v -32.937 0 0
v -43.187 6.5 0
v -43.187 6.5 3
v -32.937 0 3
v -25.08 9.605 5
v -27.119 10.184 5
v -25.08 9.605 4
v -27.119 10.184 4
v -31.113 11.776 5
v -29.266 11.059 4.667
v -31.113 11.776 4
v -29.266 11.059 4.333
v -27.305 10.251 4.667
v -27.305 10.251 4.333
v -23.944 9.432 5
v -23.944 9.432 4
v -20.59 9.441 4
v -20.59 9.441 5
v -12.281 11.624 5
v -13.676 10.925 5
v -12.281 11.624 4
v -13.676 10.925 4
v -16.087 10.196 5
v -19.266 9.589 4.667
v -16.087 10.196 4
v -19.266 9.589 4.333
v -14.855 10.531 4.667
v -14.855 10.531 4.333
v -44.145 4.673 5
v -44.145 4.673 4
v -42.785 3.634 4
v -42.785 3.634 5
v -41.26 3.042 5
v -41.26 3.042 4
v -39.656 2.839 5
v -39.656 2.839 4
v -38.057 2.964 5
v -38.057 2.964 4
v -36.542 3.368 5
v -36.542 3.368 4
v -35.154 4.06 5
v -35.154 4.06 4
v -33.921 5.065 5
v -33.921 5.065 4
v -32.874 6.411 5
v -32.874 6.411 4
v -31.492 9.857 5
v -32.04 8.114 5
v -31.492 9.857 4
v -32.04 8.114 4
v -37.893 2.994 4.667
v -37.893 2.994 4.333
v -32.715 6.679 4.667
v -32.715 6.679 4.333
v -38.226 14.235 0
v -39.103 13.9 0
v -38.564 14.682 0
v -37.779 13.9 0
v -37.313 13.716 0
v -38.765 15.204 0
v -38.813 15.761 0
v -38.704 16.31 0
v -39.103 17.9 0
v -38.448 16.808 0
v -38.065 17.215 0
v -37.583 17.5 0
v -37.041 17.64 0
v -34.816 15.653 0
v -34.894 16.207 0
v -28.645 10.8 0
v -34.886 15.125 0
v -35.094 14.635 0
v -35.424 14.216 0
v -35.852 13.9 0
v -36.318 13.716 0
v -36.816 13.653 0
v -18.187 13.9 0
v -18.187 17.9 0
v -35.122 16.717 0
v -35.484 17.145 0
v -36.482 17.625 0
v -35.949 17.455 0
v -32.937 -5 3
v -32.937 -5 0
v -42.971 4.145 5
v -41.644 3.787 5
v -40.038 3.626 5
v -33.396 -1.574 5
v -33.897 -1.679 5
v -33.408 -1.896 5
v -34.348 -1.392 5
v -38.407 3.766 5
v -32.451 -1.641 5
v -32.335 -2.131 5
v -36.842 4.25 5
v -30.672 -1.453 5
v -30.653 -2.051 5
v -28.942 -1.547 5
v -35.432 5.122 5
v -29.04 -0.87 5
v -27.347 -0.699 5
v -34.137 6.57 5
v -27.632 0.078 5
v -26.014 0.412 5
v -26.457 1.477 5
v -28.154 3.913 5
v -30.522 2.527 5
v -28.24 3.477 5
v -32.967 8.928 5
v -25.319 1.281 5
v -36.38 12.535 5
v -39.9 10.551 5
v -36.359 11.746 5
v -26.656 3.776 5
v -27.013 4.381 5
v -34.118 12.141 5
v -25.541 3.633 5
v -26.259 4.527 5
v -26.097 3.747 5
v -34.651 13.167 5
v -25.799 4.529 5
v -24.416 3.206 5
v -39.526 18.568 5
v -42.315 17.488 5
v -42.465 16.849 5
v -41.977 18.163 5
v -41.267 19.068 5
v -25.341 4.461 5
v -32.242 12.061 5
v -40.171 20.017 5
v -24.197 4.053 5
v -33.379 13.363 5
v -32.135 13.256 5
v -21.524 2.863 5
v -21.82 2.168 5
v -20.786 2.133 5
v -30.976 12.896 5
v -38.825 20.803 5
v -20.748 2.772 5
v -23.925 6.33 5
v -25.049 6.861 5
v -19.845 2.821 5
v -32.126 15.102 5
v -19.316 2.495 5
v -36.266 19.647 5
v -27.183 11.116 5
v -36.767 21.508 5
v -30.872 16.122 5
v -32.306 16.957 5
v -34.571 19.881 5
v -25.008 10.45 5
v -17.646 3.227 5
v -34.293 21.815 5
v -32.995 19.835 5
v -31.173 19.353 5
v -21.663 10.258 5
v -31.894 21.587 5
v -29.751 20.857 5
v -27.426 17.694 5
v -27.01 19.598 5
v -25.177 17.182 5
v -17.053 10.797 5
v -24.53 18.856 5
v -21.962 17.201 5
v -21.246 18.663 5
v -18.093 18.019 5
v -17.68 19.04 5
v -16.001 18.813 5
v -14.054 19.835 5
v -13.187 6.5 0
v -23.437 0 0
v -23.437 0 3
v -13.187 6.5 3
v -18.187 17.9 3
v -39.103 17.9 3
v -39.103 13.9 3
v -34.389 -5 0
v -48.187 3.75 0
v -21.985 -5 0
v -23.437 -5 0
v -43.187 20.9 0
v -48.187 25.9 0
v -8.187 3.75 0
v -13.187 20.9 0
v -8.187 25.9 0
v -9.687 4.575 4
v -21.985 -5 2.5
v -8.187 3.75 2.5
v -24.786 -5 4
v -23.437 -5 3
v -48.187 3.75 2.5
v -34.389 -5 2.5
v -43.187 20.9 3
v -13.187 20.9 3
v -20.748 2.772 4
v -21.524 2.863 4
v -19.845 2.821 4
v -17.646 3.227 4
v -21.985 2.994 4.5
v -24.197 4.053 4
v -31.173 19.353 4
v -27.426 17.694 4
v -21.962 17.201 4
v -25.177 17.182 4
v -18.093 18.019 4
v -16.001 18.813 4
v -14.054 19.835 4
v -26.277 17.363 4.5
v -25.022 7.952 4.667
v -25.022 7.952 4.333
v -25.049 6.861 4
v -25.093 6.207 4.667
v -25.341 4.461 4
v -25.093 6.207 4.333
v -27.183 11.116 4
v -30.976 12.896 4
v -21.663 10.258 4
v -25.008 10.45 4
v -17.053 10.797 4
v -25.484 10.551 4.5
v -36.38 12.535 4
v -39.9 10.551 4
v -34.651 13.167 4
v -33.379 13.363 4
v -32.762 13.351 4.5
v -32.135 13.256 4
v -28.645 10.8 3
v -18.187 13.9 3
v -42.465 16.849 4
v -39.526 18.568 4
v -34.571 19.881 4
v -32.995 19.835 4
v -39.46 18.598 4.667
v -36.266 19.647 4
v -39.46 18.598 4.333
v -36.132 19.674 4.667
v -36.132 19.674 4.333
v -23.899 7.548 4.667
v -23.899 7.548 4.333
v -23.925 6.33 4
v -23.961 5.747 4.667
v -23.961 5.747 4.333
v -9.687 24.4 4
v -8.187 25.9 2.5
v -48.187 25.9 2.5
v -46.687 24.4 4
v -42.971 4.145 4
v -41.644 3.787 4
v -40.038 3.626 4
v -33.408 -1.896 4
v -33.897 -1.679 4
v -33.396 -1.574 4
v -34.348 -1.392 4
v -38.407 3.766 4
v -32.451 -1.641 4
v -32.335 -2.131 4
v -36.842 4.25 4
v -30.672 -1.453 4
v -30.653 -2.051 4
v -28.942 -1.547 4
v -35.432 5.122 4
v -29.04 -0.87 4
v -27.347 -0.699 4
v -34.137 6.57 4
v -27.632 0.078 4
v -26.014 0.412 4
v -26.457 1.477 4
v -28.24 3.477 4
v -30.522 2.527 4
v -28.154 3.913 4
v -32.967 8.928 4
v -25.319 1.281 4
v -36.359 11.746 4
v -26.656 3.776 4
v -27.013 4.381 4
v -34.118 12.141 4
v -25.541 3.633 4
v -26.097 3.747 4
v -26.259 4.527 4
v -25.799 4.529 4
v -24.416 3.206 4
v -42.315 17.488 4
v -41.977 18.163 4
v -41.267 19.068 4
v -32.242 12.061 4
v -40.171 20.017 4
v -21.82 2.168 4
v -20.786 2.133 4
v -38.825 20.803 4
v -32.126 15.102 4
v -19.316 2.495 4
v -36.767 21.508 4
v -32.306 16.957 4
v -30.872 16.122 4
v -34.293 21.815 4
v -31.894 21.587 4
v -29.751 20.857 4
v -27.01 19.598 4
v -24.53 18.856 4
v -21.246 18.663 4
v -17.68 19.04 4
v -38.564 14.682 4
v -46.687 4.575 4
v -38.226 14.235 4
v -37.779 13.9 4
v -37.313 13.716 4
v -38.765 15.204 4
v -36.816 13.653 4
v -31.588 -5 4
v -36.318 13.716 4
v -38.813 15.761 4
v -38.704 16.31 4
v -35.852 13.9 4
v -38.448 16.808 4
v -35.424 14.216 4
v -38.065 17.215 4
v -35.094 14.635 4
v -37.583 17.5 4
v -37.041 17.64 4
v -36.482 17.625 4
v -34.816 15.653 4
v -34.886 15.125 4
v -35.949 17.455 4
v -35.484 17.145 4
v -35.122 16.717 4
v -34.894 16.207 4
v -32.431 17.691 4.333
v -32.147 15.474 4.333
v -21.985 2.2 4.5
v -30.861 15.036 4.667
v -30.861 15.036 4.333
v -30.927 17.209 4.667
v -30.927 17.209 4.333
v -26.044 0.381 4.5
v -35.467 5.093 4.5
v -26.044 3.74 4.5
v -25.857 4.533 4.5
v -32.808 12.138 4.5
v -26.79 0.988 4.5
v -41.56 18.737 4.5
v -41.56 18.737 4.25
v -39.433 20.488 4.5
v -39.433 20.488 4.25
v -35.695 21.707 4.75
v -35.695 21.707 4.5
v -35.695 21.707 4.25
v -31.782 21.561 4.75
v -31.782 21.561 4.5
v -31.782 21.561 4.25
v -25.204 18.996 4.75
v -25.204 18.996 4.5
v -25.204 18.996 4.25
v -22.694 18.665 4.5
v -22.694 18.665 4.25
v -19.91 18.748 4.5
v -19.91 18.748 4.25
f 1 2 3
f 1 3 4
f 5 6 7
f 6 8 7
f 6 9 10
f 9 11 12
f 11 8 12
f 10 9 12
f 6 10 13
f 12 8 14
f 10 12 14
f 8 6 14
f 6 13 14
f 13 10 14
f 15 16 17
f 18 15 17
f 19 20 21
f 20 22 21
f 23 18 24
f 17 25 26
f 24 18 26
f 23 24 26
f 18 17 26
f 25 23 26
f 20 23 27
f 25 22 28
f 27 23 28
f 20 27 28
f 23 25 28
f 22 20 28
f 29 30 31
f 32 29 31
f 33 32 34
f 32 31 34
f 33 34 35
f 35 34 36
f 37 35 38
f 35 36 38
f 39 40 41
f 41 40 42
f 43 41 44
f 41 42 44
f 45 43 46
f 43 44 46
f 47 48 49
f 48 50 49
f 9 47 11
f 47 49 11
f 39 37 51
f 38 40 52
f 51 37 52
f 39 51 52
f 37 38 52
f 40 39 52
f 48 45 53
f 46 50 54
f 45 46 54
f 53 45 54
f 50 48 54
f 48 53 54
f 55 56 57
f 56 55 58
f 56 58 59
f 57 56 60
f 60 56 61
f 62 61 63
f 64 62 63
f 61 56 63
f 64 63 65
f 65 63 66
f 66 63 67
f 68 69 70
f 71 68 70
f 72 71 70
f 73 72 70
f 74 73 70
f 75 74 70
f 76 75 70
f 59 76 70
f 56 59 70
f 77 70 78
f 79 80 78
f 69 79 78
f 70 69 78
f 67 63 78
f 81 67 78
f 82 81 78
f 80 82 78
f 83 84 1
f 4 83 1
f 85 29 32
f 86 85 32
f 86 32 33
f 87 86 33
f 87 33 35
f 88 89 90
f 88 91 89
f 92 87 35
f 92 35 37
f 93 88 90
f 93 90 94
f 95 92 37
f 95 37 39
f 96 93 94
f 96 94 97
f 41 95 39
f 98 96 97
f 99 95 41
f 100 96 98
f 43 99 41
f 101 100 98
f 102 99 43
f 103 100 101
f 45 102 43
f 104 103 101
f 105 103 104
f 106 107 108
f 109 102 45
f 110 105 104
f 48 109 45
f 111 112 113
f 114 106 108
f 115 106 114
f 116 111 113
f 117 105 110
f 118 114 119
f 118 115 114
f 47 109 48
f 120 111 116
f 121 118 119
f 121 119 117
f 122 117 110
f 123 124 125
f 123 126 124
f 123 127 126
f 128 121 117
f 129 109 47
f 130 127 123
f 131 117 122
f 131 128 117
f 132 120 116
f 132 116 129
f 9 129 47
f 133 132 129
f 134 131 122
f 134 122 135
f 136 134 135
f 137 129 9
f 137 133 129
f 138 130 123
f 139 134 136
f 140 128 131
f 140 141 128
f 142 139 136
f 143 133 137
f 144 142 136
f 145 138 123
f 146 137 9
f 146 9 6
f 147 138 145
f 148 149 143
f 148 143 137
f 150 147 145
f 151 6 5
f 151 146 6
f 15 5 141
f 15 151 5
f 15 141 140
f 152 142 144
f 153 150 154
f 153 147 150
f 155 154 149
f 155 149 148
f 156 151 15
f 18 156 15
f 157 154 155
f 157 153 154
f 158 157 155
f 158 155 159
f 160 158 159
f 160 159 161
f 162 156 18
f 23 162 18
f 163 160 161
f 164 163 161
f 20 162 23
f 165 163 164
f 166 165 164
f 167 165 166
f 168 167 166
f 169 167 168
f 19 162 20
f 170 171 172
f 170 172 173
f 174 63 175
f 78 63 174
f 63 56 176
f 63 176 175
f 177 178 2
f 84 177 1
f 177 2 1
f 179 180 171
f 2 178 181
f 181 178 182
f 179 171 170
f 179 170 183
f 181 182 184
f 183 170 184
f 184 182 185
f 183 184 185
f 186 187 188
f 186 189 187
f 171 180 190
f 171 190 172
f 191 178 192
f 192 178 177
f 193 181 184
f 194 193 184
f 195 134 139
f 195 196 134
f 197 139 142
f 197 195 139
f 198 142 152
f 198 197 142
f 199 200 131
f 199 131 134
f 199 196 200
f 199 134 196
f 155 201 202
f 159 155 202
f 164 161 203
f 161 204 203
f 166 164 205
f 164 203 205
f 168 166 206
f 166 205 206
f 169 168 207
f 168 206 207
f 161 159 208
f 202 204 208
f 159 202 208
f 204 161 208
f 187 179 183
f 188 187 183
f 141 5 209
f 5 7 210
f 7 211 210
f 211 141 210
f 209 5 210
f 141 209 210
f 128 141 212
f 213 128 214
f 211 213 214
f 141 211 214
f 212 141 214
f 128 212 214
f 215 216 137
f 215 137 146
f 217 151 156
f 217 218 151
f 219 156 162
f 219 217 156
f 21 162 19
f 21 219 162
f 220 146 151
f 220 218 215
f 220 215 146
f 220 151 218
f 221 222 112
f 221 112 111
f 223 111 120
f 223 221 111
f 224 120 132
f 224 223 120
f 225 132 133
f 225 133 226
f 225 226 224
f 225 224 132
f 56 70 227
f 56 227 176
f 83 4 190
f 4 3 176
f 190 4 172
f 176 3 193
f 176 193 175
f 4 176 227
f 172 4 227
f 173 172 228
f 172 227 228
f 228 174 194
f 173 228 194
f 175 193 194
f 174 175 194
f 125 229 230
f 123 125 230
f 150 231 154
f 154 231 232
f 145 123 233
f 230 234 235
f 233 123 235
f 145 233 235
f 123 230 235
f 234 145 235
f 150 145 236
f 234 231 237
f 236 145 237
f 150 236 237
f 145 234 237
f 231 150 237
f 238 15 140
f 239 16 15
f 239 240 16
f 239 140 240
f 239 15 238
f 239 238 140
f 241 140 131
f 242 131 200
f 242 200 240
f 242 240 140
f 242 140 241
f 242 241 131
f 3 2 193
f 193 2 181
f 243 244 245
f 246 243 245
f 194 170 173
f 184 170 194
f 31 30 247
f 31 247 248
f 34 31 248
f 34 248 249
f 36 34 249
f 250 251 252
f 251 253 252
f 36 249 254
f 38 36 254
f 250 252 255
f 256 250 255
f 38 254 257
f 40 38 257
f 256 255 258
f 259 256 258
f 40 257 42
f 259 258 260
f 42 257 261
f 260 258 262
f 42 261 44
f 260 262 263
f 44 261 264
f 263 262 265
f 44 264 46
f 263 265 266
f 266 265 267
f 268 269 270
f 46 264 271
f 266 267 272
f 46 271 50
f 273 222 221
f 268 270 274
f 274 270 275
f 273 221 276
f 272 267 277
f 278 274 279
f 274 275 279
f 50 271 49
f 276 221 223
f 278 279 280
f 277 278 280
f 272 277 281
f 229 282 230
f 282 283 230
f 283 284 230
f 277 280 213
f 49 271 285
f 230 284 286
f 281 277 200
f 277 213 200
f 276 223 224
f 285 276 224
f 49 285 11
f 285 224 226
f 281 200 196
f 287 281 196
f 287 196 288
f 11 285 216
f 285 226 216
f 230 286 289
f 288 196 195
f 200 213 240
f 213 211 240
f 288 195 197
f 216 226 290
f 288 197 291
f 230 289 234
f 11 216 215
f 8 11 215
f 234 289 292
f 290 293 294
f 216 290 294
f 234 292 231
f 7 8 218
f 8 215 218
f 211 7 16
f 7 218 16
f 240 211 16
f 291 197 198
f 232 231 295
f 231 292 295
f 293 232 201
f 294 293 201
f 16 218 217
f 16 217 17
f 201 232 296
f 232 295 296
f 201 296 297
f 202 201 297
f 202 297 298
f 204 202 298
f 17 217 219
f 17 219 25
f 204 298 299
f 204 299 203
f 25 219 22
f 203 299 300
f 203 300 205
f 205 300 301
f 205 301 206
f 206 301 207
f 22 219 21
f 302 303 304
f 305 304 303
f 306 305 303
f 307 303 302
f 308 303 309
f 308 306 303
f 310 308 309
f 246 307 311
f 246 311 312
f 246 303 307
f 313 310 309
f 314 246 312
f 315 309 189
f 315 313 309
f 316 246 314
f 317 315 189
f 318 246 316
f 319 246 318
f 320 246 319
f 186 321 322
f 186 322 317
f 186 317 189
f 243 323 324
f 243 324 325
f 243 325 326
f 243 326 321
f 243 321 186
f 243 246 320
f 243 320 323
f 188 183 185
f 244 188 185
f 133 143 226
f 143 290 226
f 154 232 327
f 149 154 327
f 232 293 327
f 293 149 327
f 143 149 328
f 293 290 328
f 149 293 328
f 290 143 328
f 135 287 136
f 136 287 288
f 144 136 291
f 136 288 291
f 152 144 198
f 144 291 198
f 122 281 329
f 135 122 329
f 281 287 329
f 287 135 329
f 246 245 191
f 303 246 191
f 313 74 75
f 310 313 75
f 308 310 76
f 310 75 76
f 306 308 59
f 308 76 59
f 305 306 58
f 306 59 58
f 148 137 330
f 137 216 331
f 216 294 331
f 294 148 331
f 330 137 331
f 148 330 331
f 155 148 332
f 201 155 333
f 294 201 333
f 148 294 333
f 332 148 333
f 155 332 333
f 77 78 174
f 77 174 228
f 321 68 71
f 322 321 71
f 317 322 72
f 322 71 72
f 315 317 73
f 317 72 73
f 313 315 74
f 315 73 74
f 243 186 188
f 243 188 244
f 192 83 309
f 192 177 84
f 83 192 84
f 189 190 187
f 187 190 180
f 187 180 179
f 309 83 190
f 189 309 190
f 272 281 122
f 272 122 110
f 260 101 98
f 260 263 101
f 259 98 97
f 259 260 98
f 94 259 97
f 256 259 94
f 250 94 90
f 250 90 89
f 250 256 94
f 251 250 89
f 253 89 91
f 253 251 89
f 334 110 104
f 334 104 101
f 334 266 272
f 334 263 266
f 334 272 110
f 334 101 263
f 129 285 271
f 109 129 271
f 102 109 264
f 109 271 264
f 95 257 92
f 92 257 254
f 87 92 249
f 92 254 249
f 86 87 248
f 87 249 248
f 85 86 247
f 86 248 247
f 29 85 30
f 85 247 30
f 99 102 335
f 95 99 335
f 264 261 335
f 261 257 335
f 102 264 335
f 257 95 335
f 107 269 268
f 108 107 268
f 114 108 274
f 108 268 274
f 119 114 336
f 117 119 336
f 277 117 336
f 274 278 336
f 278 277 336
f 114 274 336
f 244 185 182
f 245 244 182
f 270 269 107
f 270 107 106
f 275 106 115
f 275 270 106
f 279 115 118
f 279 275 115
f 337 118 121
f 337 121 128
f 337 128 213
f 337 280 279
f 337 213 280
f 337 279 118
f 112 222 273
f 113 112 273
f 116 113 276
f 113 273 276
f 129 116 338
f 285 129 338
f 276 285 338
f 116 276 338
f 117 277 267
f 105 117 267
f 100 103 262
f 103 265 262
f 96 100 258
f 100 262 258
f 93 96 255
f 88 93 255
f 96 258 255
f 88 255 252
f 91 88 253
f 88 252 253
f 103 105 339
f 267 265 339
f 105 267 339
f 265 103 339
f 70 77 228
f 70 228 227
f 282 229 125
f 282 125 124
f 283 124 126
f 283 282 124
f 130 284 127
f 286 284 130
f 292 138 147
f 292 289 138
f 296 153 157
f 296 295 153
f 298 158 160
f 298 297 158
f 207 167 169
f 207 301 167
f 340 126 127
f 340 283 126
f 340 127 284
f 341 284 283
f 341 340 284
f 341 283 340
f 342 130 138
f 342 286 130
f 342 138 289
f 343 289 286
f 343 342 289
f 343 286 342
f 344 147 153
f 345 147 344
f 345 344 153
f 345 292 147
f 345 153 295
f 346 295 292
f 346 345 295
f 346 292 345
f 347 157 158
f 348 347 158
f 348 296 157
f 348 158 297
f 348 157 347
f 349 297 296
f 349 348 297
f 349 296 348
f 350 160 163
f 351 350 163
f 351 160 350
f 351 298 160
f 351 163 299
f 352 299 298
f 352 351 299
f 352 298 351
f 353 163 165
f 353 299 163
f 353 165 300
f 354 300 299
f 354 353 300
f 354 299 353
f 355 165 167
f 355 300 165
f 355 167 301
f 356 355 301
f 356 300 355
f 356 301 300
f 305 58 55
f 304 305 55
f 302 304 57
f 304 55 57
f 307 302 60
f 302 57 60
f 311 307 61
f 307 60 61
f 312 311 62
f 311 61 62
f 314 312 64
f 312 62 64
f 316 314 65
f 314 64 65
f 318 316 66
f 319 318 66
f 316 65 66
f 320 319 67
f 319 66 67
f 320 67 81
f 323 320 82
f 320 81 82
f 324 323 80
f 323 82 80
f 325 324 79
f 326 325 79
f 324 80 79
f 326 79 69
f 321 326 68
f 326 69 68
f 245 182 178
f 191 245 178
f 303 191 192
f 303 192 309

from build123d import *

# Parameters (mm, degrees)
F0_W     = 30
F0_H     = 14.4
F0_W_2   = 9.5
F0_H_2   = 5
F1_DEPTH = 4
F2_DEPTH = 3
F4_DEPTH = 1
F5_SIZE  = 1.5


with BuildPart() as f1:
    # F0 (on Top) → F1 (new body)
    with BuildSketch(Plane.XY):
        Polygon((-43.1869083047, 6.5), (-43.1869083047, 20.9), (-13.1869083047, 20.9), (-13.1869083047, 6.5), (-23.4369083047, 0), (-23.4369083047, -5), (-21.9851882324, -5), (-8.1869083047, 3.7501287347), (-8.1869083047, 25.9), (-48.1869083047, 25.9), (-48.1869083047, 3.7501287347), (-34.388628377, -5), (-32.9369083047, -5), (-32.9369083047, 0), align=None)
        with Locations((-28.1869083047, 13.7)):
            Rectangle(F0_W, F0_H)
        Polygon((-39.1032992899, 13.9), (-39.1032992899, 17.9), (-18.1869083047, 17.9), (-18.1869083047, 13.9), (-28.6451037973, 10.8), align=None, mode=Mode.SUBTRACT)
        Polygon((-13.1869083047, 6.5), (-43.1869083047, 6.5), (-32.9369083047, 0), (-23.4369083047, 0), align=None)
        with Locations((-28.1869083047, -2.5)):
            Rectangle(F0_W_2, F0_H_2)
        with BuildLine():
            Line((-18.1869083047, 17.9), (-39.1032992899, 17.9))
            Line((-39.1032992899, 17.9), (-39.1032992899, 13.9))
            Line((-39.1032992899, 13.9), (-37.7786630825, 13.9))
            ThreePointArc((-37.7786630825, 13.9), (-37.8338156014, 17.3741977051), (-34.8155427277, 15.6528260559))
            ThreePointArc((-34.8155427277, 15.6528260559), (-35.0941710785, 14.6345531822), (-35.8524223729, 13.9))
            Line((-35.8524223729, 13.9), (-18.1869083047, 13.9))
            Line((-18.1869083047, 13.9), (-18.1869083047, 17.9))
        make_face()
        with BuildLine():
            Line((-37.7786630825, 13.9), (-39.1032992899, 13.9))
            Line((-39.1032992899, 13.9), (-28.6451037973, 10.8))
            Line((-28.6451037973, 10.8), (-18.1869083047, 13.9))
            Line((-18.1869083047, 13.9), (-35.8524223729, 13.9))
            ThreePointArc((-35.8524223729, 13.9), (-36.8155427277, 13.6528260559), (-37.7786630825, 13.9))
        make_face()
    extrude(amount=F1_DEPTH)

    # F0 (on Top) → F2 (cut)
    with BuildSketch(Plane.XY):
        with Locations((-28.1869083047, 13.7)):
            Rectangle(F0_W, F0_H)
        Polygon((-39.1032992899, 13.9), (-39.1032992899, 17.9), (-18.1869083047, 17.9), (-18.1869083047, 13.9), (-28.6451037973, 10.8), align=None, mode=Mode.SUBTRACT)
        Polygon((-13.1869083047, 6.5), (-43.1869083047, 6.5), (-32.9369083047, 0), (-23.4369083047, 0), align=None)
        with Locations((-28.1869083047, -2.5)):
            Rectangle(F0_W_2, F0_H_2)
    extrude(amount=F2_DEPTH, mode=Mode.SUBTRACT)

    # F5
    f5_edges = [f1.edges().sort_by_distance(p)[0] for p in [
        (-41.287768, -0.624936, 4),
        (-48.186908, 14.825064, 4),
        (-28.186908, 25.9, 4),
        (-8.186908, 14.825064, 4),
        (-15.086048, -0.624936, 4),
    ]]
    chamfer(f5_edges, length=F5_SIZE)


with BuildPart() as f4:
    # F3 (on face) → F4 (new body)
    with BuildSketch(Plane.XY.offset(4)):
        with BuildLine():
            add(Edge.make_bspline(
                [(-42.4654167145, 16.8494712561), (-39.7938375841, 18.8531576552), (-35.864648273, 20.2127791296), (-32.9948905855, 19.8352541775)],
                knots=[0, 0, 0, 0, 0.3367336674, 0.3367336674, 0.3367336674, 0.3367336674], degree=3))
            add(Edge.make_bspline(
                [(-32.9948905855, 19.8352541775), (-32.3440314578, 19.7496317703), (-31.7476673073, 19.5746541344), (-31.1734072618, 19.3531280695)],
                knots=[0.3367336674, 0.3367336674, 0.3367336674, 0.3367336674, 0.4131046384, 0.4131046384, 0.4131046384, 0.4131046384], degree=3))
            add(Edge.make_bspline(
                [(-31.1734072618, 19.3531280695), (-29.5978329229, 18.7453358574), (-25.6508147134, 16.0615042571), (-17.7608904848, 17.5646834939), (-14.0538355336, 19.8352541775)],
                knots=[0.4131046384, 0.4131046384, 0.4131046384, 0.4131046384, 0.6226406196, 1, 1, 1, 1], degree=3))
            add(Edge.make_bspline(
                [(-42.4654167145, 16.8494712561), (-42.3726604929, 18.008949951), (-39.5993766245, 21.4286085388), (-31.3253802251, 22.5074804398), (-25.4250962682, 17.798905064), (-17.9107243535, 18.8059261112), (-14.0538355336, 19.8352541775)],
                knots=[0, 0, 0, 0, 0.1986315254, 0.4523082805, 0.6948192618, 1, 1, 1, 1], degree=3))
        make_face()
        with BuildLine():
            add(Edge.make_bspline(
                [(-32.9948905855, 19.8352541775), (-32.3440314578, 19.7496317703), (-31.7476673073, 19.5746541344), (-31.1734072618, 19.3531280695)],
                knots=[0.3367336674, 0.3367336674, 0.3367336674, 0.3367336674, 0.4131046384, 0.4131046384, 0.4131046384, 0.4131046384], degree=3))
            add(Edge.make_bspline(
                [(-32.9948905855, 19.8352541775), (-32.2896273329, 17.753049629), (-32.0126127544, 15.4491126865), (-32.1345889722, 13.255812889)],
                knots=[0, 0, 0, 0, 0.2225431575, 0.2225431575, 0.2225431575, 0.2225431575], degree=3))
            add(Edge.make_bspline(
                [(-32.134588974, 13.2558128888), (-31.7475533394, 13.1731038166), (-31.3627928139, 13.0483545557), (-30.9761098202, 12.8961333799)],
                knots=[0.3286914696, 0.3286914696, 0.3286914696, 0.3286914696, 0.3802894739, 0.3802894739, 0.3802894739, 0.3802894739], degree=3))
            add(Edge.make_bspline(
                [(-30.976109827, 12.8961333789), (-30.7712879528, 14.9993919589), (-30.8365034569, 17.2432759127), (-31.1734072618, 19.3531280695)],
                knots=[0.8062718014, 0.8062718014, 0.8062718014, 0.8062718014, 1, 1, 1, 1], degree=3))
        make_face()
        with BuildLine():
            add(Edge.make_bspline(
                [(-32.1345889722, 13.255812889), (-32.1569847951, 12.8531052564), (-32.1928313712, 12.4541274165), (-32.2419476004, 12.0609366653)],
                knots=[0.2225431575, 0.2225431575, 0.2225431575, 0.2225431575, 0.2634038863, 0.2634038863, 0.2634038863, 0.2634038863], degree=3))
            add(Edge.make_bspline(
                [(-39.8995094001, 10.551338084), (-37.4732565623, 12.0421009296), (-34.8160280141, 13.6831493791), (-32.3427257342, 13.3002914763), (-32.134588974, 13.2558128888)],
                knots=[0, 0, 0, 0, 0.3009435298, 0.3286914696, 0.3286914696, 0.3286914696, 0.3286914696], degree=3))
            add(Edge.make_bspline(
                [(-39.8995094001, 10.551338084), (-38.2007072715, 11.1867110314), (-35.0695646892, 12.456761007), (-32.4286591287, 12.094066028), (-32.2419476145, 12.0609366664)],
                knots=[0, 0, 0, 0, 0.2934865557, 0.3160525993, 0.3160525993, 0.3160525993, 0.3160525993], degree=3))
        make_face()
        with BuildLine():
            add(Edge.make_bspline(
                [(-30.9761098202, 12.8961333799), (-29.2963172809, 12.23486821), (-24.551812522, 8.9733096857), (-16.899658367, 10.8779082075), (-12.2810266912, 11.6243530065)],
                knots=[0.3802894739, 0.3802894739, 0.3802894739, 0.3802894739, 0.6044367579, 1, 1, 1, 1], degree=3))
            add(Edge.make_bspline(
                [(-31.112915177, 11.7758911415), (-31.0585745099, 12.1436838454), (-31.0129695193, 12.5176314999), (-30.976109827, 12.8961333789)],
                knots=[0.771408524, 0.771408524, 0.771408524, 0.771408524, 0.8062718014, 0.8062718014, 0.8062718014, 0.8062718014], degree=3))
            add(Edge.make_bspline(
                [(-31.1129151777, 11.7758911415), (-29.2735553981, 11.1875546271), (-27.486927637, 10.0877460543), (-25.0796457725, 9.6045233315)],
                knots=[0.362248868, 0.362248868, 0.362248868, 0.362248868, 0.590469567, 0.590469567, 0.590469567, 0.590469567], degree=3))
            add(Edge.make_bspline(
                [(-25.0796457725, 9.6045233315), (-24.7161044464, 9.5315483168), (-24.3384083341, 9.4726353068), (-23.9442382008, 9.4316694885)],
                knots=[0.590469567, 0.590469567, 0.590469567, 0.590469567, 0.624934852, 0.624934852, 0.624934852, 0.624934852], degree=3))
            add(Edge.make_bspline(
                [(-23.9442382008, 9.4316694885), (-19.6547196513, 8.985862913), (-13.4142369665, 10.665483242), (-12.2810266912, 11.6243530065)],
                knots=[0.624934852, 0.624934852, 0.624934852, 0.624934852, 1, 1, 1, 1], degree=3))
        make_face()
        with BuildLine():
            add(Edge.make_bspline(
                [(-32.134588974, 13.2558128888), (-31.7475533394, 13.1731038166), (-31.3627928139, 13.0483545557), (-30.9761098202, 12.8961333799)],
                knots=[0.3286914696, 0.3286914696, 0.3286914696, 0.3286914696, 0.3802894739, 0.3802894739, 0.3802894739, 0.3802894739], degree=3))
            add(Edge.make_bspline(
                [(-32.1345889722, 13.255812889), (-32.1569847951, 12.8531052564), (-32.1928313712, 12.4541274165), (-32.2419476004, 12.0609366653)],
                knots=[0.2225431575, 0.2225431575, 0.2225431575, 0.2225431575, 0.2634038863, 0.2634038863, 0.2634038863, 0.2634038863], degree=3))
            add(Edge.make_bspline(
                [(-32.2419476145, 12.0609366664), (-31.8597195461, 11.9931156113), (-31.4852370526, 11.8949817928), (-31.1129151777, 11.7758911415)],
                knots=[0.3160525993, 0.3160525993, 0.3160525993, 0.3160525993, 0.362248868, 0.362248868, 0.362248868, 0.362248868], degree=3))
            add(Edge.make_bspline(
                [(-31.112915177, 11.7758911415), (-31.0585745099, 12.1436838454), (-31.0129695193, 12.5176314999), (-30.976109827, 12.8961333789)],
                knots=[0.771408524, 0.771408524, 0.771408524, 0.771408524, 0.8062718014, 0.8062718014, 0.8062718014, 0.8062718014], degree=3))
        make_face()
        with BuildLine():
            add(Edge.make_bspline(
                [(-32.2419476145, 12.0609366664), (-31.8597195461, 11.9931156113), (-31.4852370526, 11.8949817928), (-31.1129151777, 11.7758911415)],
                knots=[0.3160525993, 0.3160525993, 0.3160525993, 0.3160525993, 0.362248868, 0.362248868, 0.362248868, 0.362248868], degree=3))
            add(Edge.make_bspline(
                [(-32.2419476004, 12.0609366653), (-32.6073918669, 9.1354412048), (-35.2726418826, 2.8236045142), (-41.8122783303, 3.3667995594), (-44.1449210048, 4.6730795875)],
                knots=[0.2634038863, 0.2634038863, 0.2634038863, 0.2634038863, 0.5674239482, 1, 1, 1, 1], degree=3))
            add(Edge.make_bspline(
                [(-44.1449210048, 4.6730795875), (-42.4360304347, 2.9172204585), (-37.6356661883, 2.2588303615), (-32.7788568242, 5.2397269583), (-31.4013304686, 9.8238164685), (-31.112915177, 11.7758911415)],
                knots=[0, 0, 0, 0, 0.2945227107, 0.5863702675, 0.771408524, 0.771408524, 0.771408524, 0.771408524], degree=3))
        make_face()
        with BuildLine():
            add(Edge.make_bspline(
                [(-25.0796457725, 9.6045233315), (-24.7161044464, 9.5315483168), (-24.3384083341, 9.4726353068), (-23.9442382008, 9.4316694885)],
                knots=[0.590469567, 0.590469567, 0.590469567, 0.590469567, 0.624934852, 0.624934852, 0.624934852, 0.624934852], degree=3))
            add(Edge.make_bspline(
                [(-25.0796457725, 9.6045233315), (-24.9734072616, 8.0267808085), (-24.9890853523, 6.1789301298), (-25.3412728696, 4.4612159346)],
                knots=[0, 0, 0, 0, 0.2932023186, 0.2932023186, 0.2932023186, 0.2932023186], degree=3))
            add(Edge.make_bspline(
                [(-25.3412728564, 4.4612159321), (-24.9556596717, 4.3763306971), (-24.5736644604, 4.2275105969), (-24.197272273, 4.053112762)],
                knots=[0.3940903335, 0.3940903335, 0.3940903335, 0.3940903335, 0.486042244, 0.486042244, 0.486042244, 0.486042244], degree=3))
            add(Edge.make_bspline(
                [(-23.9442382008, 9.4316694885), (-23.8685441759, 7.5140960035), (-23.8520826412, 5.6859897217), (-24.1972722811, 4.053112762)],
                knots=[0, 0, 0, 0, 0.2764976522, 0.2764976522, 0.2764976522, 0.2764976522], degree=3))
        make_face()
        with BuildLine():
            add(Edge.make_bspline(
                [(-24.197272273, 4.053112762), (-23.4309801461, 3.6980584003), (-21.3909257082, 2.4322158399), (-19.6521766484, 2.8069657274), (-17.6461040974, 3.2268413343)],
                knots=[0.486042244, 0.486042244, 0.486042244, 0.486042244, 0.6732459838, 1, 1, 1, 1], degree=3))
            add(Edge.make_bspline(
                [(-24.1972722811, 4.053112762), (-24.258280878, 3.7645191292), (-24.3305863011, 3.482023836), (-24.4158581353, 3.2062107713)],
                knots=[0.2764976522, 0.2764976522, 0.2764976522, 0.2764976522, 0.325365671, 0.325365671, 0.325365671, 0.325365671], degree=3))
            add(Edge.make_bspline(
                [(-24.4158581101, 3.2062107668), (-23.590972038, 2.8311126201), (-21.4214831622, 1.6170506773), (-19.3722583354, 2.3870898876), (-17.6461040974, 3.2268413343)],
                knots=[0.4686999018, 0.4686999018, 0.4686999018, 0.4686999018, 0.6674310157, 1, 1, 1, 1], degree=3))
        make_face()
        with BuildLine():
            add(Edge.make_bspline(
                [(-25.3412728564, 4.4612159321), (-24.9556596717, 4.3763306971), (-24.5736644604, 4.2275105969), (-24.197272273, 4.053112762)],
                knots=[0.3940903335, 0.3940903335, 0.3940903335, 0.3940903335, 0.486042244, 0.486042244, 0.486042244, 0.486042244], degree=3))
            add(Edge.make_bspline(
                [(-25.3412728696, 4.4612159346), (-25.3986905319, 4.1811743976), (-25.4650523701, 3.9045917937), (-25.5412882704, 3.6332024867)],
                knots=[0.2932023186, 0.2932023186, 0.2932023186, 0.2932023186, 0.341003535, 0.341003535, 0.341003535, 0.341003535], degree=3))
            add(Edge.make_bspline(
                [(-25.541288286, 3.6332024911), (-25.1636236146, 3.5288828613), (-24.7883749037, 3.375604291), (-24.4158581101, 3.2062107668)],
                knots=[0.3789533539, 0.3789533539, 0.3789533539, 0.3789533539, 0.4686999018, 0.4686999018, 0.4686999018, 0.4686999018], degree=3))
            add(Edge.make_bspline(
                [(-24.1972722811, 4.053112762), (-24.258280878, 3.7645191292), (-24.3305863011, 3.482023836), (-24.4158581353, 3.2062107713)],
                knots=[0.2764976522, 0.2764976522, 0.2764976522, 0.2764976522, 0.325365671, 0.325365671, 0.325365671, 0.325365671], degree=3))
        make_face()
        with BuildLine():
            add(Edge.make_bspline(
                [(-25.3412728696, 4.4612159346), (-25.3986905319, 4.1811743976), (-25.4650523701, 3.9045917937), (-25.5412882704, 3.6332024867)],
                knots=[0.2932023186, 0.2932023186, 0.2932023186, 0.2932023186, 0.341003535, 0.341003535, 0.341003535, 0.341003535], degree=3))
            add(Edge.make_bspline(
                [(-30.5222887546, 2.5270488113), (-28.8819089365, 3.4958588937), (-27.1720866653, 4.7410257623), (-25.5125274132, 4.4989142885), (-25.3412728564, 4.4612159321)],
                knots=[0, 0, 0, 0, 0.3532535978, 0.3940903335, 0.3940903335, 0.3940903335, 0.3940903335], degree=3))
            add(Edge.make_bspline(
                [(-30.5222887546, 2.5270488113), (-28.9472388962, 3.2456805901), (-27.3074611458, 4.0284117853), (-25.7082677545, 3.6793260437), (-25.541288286, 3.6332024911)],
                knots=[0, 0, 0, 0, 0.3392730978, 0.3789533539, 0.3789533539, 0.3789533539, 0.3789533539], degree=3))
        make_face()
        with BuildLine():
            add(Edge.make_bspline(
                [(-25.541288286, 3.6332024911), (-25.1636236146, 3.5288828613), (-24.7883749037, 3.375604291), (-24.4158581101, 3.2062107668)],
                knots=[0.3789533539, 0.3789533539, 0.3789533539, 0.3789533539, 0.4686999018, 0.4686999018, 0.4686999018, 0.4686999018], degree=3))
            add(Edge.make_bspline(
                [(-25.5412882704, 3.6332024867), (-25.8154404803, 2.6572583722), (-27.3559647856, -0.8266993526), (-31.4086936414, -2.1382363047), (-34.347821027, -1.3917906908)],
                knots=[0.341003535, 0.341003535, 0.341003535, 0.341003535, 0.5129016702, 1, 1, 1, 1], degree=3))
            add(Edge.make_bspline(
                [(-24.4158581353, 3.2062107713), (-24.7402109886, 2.1570864562), (-26.5982963118, -1.2996818857), (-32.1379193429, -3.0596398465), (-34.347821027, -1.3917906908)],
                knots=[0.325365671, 0.325365671, 0.325365671, 0.325365671, 0.511247463, 1, 1, 1, 1], degree=3))
        make_face()
    extrude(amount=F4_DEPTH)


solid = Compound([f1.part, f4.part])
